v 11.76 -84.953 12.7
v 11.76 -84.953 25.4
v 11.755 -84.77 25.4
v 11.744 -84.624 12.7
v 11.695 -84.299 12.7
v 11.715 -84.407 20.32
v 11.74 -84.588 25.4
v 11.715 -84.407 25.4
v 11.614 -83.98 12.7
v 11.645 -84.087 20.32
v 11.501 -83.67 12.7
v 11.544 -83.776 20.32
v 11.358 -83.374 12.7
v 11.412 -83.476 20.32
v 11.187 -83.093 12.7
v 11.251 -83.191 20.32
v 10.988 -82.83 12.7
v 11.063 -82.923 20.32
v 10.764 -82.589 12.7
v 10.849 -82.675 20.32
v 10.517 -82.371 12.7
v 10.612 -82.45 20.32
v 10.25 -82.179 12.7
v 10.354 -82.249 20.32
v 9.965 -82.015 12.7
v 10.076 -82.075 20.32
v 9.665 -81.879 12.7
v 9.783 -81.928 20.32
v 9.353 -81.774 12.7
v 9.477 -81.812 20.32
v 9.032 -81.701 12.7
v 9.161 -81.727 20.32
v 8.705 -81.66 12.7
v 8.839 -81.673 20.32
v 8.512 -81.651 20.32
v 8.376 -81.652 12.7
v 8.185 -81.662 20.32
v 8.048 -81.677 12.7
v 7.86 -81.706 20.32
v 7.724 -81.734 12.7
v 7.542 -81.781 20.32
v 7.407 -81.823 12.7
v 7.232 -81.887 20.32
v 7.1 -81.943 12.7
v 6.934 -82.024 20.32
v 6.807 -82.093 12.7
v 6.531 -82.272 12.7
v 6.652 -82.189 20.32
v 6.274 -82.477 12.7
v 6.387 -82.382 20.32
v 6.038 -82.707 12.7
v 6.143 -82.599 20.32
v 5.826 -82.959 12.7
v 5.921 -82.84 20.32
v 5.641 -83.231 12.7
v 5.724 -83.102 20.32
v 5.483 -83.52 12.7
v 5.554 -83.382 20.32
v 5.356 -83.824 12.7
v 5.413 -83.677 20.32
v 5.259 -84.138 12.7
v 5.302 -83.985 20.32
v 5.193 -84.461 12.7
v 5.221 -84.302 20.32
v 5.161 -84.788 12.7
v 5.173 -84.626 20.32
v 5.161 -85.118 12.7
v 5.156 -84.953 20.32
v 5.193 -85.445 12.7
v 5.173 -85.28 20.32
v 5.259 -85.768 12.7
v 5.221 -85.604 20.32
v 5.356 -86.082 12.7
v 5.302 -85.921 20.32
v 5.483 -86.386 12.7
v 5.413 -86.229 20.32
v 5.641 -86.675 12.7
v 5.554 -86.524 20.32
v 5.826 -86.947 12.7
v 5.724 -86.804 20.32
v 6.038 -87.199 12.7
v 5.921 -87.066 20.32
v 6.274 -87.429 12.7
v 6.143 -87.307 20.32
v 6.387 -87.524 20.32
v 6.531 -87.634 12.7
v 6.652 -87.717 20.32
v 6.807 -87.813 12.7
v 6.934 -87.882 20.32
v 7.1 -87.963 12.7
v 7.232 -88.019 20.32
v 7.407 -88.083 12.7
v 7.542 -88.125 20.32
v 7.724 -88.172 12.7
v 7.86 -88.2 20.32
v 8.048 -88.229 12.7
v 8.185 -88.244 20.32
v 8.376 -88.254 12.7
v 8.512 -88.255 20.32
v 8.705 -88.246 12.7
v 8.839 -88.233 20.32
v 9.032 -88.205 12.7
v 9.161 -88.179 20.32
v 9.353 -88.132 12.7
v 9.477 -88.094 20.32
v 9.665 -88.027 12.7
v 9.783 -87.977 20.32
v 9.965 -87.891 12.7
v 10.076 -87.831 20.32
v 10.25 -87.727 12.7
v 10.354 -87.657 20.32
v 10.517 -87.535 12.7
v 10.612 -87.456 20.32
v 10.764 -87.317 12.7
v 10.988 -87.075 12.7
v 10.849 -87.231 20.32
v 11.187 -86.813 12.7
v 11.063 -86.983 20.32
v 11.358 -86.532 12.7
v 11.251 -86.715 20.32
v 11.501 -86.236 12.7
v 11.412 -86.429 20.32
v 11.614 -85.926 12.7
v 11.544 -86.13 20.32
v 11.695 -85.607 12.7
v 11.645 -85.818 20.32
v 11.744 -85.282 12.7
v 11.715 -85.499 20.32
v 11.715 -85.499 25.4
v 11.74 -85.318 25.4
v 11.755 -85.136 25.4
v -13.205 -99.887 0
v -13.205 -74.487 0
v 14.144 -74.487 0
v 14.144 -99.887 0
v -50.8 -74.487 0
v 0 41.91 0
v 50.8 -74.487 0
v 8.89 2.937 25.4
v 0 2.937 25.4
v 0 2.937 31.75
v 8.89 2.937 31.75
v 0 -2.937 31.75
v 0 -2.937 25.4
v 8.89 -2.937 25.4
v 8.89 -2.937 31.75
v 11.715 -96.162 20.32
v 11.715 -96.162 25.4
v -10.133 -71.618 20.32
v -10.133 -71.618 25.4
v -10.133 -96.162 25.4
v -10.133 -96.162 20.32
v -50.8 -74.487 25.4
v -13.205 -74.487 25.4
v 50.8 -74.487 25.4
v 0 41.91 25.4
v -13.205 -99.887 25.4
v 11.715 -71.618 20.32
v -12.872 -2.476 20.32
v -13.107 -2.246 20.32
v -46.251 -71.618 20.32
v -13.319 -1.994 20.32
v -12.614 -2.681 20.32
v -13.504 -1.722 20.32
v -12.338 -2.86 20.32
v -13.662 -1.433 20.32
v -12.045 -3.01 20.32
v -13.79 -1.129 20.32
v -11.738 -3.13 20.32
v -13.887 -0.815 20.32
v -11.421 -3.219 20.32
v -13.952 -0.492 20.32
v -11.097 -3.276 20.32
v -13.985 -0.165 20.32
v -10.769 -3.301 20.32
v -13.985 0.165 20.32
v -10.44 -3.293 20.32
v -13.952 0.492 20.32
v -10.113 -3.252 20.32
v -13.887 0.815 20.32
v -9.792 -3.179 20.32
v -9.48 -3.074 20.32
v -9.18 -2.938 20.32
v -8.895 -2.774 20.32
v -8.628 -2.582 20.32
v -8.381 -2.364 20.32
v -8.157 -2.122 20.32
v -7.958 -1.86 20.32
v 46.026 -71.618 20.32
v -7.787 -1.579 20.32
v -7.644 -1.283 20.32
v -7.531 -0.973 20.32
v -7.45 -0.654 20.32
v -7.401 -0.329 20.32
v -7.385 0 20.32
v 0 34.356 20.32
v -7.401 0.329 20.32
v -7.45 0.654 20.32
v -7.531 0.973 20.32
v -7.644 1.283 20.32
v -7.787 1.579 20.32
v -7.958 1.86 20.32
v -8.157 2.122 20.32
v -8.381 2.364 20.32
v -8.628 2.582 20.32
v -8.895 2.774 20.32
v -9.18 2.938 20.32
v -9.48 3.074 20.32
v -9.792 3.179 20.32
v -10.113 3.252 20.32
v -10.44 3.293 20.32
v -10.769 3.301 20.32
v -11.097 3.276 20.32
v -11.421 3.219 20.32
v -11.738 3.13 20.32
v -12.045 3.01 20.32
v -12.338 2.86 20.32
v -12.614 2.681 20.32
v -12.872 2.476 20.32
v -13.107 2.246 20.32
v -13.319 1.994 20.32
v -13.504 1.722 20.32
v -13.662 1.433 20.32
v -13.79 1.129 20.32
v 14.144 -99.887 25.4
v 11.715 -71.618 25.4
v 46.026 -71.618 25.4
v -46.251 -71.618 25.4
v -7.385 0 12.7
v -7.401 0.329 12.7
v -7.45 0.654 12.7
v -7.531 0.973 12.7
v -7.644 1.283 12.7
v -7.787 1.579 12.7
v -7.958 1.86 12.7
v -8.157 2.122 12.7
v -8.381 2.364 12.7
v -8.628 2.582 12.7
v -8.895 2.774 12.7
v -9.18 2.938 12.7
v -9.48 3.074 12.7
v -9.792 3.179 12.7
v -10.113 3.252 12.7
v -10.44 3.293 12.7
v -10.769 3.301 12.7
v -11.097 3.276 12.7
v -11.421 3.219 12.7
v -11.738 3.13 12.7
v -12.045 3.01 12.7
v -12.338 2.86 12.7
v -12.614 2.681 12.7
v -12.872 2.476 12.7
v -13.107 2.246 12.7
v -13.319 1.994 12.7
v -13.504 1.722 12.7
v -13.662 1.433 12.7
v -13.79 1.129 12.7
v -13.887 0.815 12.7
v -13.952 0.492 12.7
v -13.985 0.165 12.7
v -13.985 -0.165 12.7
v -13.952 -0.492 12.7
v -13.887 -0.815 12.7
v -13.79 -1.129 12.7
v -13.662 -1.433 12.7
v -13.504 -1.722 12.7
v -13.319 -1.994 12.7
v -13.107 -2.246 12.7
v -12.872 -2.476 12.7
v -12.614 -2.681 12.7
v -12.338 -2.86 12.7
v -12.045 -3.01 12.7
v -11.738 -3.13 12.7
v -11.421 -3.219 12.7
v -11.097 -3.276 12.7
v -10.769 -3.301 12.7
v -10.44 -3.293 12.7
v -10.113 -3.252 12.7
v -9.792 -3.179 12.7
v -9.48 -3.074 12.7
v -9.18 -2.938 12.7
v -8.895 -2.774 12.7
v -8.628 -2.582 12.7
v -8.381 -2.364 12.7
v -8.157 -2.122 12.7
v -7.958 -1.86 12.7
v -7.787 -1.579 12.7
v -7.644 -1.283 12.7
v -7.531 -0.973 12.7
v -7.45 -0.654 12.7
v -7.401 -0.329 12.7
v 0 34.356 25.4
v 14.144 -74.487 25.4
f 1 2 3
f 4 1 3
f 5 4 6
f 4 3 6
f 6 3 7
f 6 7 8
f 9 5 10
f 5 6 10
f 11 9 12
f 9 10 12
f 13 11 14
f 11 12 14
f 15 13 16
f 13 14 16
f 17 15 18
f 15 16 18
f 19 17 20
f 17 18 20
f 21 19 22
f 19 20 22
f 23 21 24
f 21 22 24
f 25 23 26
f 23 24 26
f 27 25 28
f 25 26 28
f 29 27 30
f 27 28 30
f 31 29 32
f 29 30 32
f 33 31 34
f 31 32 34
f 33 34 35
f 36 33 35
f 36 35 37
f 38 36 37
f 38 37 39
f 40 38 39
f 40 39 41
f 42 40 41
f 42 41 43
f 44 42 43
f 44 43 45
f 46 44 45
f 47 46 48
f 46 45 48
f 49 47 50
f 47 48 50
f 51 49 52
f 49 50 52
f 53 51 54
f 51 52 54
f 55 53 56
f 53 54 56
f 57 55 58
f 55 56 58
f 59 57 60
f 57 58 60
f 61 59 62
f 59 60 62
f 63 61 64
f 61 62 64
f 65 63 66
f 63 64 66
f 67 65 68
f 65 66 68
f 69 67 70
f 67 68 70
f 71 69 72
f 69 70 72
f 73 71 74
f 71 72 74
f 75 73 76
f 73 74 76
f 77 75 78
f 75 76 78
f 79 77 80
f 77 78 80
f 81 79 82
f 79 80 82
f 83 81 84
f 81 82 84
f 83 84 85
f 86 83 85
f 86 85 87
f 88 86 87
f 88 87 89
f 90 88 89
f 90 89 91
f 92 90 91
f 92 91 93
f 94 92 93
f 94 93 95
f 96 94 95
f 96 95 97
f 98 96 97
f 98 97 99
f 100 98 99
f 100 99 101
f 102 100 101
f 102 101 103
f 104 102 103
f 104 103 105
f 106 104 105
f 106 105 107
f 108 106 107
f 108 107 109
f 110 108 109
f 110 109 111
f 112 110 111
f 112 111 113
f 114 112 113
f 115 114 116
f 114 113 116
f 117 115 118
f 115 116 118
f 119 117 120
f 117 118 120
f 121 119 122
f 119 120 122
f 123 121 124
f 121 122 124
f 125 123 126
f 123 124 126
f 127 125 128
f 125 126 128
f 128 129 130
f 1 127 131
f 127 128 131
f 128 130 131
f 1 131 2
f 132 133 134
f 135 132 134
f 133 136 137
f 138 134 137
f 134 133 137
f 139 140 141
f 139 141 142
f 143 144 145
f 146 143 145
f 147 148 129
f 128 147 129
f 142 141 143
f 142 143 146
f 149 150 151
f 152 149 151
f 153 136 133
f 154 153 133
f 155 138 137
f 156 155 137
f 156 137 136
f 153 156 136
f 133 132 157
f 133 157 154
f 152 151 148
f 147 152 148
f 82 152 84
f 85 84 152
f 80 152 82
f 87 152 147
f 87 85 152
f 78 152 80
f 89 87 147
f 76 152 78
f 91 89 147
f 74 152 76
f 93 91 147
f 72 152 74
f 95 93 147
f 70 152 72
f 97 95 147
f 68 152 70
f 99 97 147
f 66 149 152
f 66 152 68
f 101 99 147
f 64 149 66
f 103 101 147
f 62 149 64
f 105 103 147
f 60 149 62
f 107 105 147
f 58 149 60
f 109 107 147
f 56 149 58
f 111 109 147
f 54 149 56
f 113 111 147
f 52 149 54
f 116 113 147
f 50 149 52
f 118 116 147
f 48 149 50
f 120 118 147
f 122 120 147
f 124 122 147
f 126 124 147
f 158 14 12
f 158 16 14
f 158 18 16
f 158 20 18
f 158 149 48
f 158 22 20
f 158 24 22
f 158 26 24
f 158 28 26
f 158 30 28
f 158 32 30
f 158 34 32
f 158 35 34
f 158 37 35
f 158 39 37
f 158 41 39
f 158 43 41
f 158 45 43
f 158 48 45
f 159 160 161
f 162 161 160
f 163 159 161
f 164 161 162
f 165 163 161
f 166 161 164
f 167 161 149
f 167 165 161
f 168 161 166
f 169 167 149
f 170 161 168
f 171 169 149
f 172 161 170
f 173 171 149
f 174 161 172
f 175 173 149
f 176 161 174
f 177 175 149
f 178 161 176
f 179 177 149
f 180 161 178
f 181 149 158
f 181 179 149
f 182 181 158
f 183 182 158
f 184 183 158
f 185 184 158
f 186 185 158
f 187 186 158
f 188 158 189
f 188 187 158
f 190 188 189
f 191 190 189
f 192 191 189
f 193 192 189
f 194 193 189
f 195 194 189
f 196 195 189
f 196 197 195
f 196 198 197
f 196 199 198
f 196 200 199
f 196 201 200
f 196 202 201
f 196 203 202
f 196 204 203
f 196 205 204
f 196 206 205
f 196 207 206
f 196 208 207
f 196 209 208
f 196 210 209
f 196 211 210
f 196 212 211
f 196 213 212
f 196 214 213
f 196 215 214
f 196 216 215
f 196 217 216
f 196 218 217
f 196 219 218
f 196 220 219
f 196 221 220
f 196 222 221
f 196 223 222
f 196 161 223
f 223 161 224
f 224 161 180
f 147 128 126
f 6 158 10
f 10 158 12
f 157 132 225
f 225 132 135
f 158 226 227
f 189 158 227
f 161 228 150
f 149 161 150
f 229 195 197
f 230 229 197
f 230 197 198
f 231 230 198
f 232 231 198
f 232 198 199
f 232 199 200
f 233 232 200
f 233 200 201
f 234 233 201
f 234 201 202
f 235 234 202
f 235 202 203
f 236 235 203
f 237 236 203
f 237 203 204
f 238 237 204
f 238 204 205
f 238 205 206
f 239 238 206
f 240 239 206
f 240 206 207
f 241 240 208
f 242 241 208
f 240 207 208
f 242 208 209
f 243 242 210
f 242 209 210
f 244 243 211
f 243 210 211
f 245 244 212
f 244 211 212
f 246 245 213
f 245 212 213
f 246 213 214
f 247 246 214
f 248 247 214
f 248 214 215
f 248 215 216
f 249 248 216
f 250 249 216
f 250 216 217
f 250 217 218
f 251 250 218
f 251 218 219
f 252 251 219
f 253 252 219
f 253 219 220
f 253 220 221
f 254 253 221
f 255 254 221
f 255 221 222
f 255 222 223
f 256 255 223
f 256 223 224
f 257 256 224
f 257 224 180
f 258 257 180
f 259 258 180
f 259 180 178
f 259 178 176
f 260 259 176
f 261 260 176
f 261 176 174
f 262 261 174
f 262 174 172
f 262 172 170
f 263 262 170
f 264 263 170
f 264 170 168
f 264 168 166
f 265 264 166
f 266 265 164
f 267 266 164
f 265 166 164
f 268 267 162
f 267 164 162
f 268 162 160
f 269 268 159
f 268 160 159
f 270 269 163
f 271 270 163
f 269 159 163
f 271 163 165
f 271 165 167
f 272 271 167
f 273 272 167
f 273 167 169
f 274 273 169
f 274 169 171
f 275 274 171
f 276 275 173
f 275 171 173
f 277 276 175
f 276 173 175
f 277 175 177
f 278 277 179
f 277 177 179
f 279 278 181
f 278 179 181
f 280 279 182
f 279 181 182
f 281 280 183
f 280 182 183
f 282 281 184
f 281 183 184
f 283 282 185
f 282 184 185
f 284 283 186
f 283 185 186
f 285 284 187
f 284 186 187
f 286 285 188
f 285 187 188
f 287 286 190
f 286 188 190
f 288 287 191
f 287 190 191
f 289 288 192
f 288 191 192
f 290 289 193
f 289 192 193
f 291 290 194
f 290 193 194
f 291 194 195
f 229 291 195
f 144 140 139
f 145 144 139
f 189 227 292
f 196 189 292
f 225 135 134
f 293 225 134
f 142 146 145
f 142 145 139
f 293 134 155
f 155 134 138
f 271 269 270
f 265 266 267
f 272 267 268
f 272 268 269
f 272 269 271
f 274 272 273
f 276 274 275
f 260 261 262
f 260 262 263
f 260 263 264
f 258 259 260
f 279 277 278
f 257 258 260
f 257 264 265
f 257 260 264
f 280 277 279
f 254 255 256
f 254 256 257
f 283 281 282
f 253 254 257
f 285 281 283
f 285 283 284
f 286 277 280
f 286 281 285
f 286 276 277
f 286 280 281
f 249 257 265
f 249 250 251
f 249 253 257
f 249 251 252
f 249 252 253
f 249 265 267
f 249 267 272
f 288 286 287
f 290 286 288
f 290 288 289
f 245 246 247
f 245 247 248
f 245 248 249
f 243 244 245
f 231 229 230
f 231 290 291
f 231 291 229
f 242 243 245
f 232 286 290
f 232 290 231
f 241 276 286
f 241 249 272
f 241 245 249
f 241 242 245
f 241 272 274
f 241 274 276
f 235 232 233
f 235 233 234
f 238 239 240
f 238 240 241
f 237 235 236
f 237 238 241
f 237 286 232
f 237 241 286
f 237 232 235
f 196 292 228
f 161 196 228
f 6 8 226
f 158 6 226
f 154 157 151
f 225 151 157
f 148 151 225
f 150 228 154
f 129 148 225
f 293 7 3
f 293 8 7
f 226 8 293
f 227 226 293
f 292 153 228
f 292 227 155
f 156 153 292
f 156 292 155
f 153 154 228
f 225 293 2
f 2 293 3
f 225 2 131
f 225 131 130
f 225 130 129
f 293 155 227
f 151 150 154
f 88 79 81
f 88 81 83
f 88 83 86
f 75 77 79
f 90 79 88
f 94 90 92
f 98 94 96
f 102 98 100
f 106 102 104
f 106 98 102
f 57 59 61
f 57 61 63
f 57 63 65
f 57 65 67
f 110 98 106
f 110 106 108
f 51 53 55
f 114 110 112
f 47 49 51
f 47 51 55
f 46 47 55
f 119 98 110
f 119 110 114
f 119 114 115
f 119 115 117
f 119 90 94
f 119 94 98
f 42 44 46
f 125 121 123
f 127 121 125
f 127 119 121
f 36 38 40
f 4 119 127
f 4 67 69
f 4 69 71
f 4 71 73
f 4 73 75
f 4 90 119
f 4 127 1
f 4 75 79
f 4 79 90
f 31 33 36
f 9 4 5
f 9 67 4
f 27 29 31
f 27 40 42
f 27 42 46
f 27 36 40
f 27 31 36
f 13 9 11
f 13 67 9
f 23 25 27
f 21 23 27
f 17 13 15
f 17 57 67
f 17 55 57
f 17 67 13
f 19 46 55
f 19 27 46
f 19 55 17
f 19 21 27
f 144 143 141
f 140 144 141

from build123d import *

# Parameters (mm, degrees)
F0_W     = 27.348692
F0_H     = 25.4
F1_DEPTH = 25.4
F2_R     = 3.302
F3_DEPTH = 12.7
F4_R     = 3.302
F5_DEPTH = 12.7
F6_W     = 8.890313
F6_H     = 5.873526
F7_DEPTH = 6.35
F9_DEPTH = 5.08


with BuildPart() as f1:
    # F0 (on Top) → F1 (new body)
    with BuildSketch(Plane.XY):
        Polygon((0, 41.910004), (-50.8, -74.487419), (-13.205145, -74.487419), (14.143547, -74.487419), (50.8, -74.487419), align=None)
        with Locations((0.469201, -87.187419)):
            Rectangle(F0_W, F0_H)
    extrude(amount=F1_DEPTH)

    # F2 (on face) → F3 (cut)
    with BuildSketch(Plane.XY.offset(25.4)):
        with Locations((8.458448, -84.95298)):
            Circle(F2_R)
    extrude(amount=-F3_DEPTH, mode=Mode.SUBTRACT)

    # F4 (on face) → F5 (cut)
    with BuildSketch(Plane.XY.offset(25.4)):
        with Locations((-10.686642, 0)):
            Circle(F4_R)
    extrude(amount=-F5_DEPTH, mode=Mode.SUBTRACT)

    # F6 (on face) → F7 (join)
    with BuildSketch(Plane.XY.offset(25.4)):
        with Locations((4.445156, 0)):
            Rectangle(F6_W, F6_H)
    extrude(amount=F7_DEPTH)

    # F8 (on face) → F9 (cut)
    with BuildSketch(Plane.XY.offset(25.4)):
        Polygon((46.025719, -71.617727), (0, 34.356341), (-46.250875, -71.617727), (-13.205145, -71.617727), (-10.132826, -71.617727), (-10.132826, -96.162423), (11.715042, -96.162423), (11.715042, -71.617727), align=None)
    extrude(amount=-F9_DEPTH, mode=Mode.SUBTRACT)


solid = f1.part
